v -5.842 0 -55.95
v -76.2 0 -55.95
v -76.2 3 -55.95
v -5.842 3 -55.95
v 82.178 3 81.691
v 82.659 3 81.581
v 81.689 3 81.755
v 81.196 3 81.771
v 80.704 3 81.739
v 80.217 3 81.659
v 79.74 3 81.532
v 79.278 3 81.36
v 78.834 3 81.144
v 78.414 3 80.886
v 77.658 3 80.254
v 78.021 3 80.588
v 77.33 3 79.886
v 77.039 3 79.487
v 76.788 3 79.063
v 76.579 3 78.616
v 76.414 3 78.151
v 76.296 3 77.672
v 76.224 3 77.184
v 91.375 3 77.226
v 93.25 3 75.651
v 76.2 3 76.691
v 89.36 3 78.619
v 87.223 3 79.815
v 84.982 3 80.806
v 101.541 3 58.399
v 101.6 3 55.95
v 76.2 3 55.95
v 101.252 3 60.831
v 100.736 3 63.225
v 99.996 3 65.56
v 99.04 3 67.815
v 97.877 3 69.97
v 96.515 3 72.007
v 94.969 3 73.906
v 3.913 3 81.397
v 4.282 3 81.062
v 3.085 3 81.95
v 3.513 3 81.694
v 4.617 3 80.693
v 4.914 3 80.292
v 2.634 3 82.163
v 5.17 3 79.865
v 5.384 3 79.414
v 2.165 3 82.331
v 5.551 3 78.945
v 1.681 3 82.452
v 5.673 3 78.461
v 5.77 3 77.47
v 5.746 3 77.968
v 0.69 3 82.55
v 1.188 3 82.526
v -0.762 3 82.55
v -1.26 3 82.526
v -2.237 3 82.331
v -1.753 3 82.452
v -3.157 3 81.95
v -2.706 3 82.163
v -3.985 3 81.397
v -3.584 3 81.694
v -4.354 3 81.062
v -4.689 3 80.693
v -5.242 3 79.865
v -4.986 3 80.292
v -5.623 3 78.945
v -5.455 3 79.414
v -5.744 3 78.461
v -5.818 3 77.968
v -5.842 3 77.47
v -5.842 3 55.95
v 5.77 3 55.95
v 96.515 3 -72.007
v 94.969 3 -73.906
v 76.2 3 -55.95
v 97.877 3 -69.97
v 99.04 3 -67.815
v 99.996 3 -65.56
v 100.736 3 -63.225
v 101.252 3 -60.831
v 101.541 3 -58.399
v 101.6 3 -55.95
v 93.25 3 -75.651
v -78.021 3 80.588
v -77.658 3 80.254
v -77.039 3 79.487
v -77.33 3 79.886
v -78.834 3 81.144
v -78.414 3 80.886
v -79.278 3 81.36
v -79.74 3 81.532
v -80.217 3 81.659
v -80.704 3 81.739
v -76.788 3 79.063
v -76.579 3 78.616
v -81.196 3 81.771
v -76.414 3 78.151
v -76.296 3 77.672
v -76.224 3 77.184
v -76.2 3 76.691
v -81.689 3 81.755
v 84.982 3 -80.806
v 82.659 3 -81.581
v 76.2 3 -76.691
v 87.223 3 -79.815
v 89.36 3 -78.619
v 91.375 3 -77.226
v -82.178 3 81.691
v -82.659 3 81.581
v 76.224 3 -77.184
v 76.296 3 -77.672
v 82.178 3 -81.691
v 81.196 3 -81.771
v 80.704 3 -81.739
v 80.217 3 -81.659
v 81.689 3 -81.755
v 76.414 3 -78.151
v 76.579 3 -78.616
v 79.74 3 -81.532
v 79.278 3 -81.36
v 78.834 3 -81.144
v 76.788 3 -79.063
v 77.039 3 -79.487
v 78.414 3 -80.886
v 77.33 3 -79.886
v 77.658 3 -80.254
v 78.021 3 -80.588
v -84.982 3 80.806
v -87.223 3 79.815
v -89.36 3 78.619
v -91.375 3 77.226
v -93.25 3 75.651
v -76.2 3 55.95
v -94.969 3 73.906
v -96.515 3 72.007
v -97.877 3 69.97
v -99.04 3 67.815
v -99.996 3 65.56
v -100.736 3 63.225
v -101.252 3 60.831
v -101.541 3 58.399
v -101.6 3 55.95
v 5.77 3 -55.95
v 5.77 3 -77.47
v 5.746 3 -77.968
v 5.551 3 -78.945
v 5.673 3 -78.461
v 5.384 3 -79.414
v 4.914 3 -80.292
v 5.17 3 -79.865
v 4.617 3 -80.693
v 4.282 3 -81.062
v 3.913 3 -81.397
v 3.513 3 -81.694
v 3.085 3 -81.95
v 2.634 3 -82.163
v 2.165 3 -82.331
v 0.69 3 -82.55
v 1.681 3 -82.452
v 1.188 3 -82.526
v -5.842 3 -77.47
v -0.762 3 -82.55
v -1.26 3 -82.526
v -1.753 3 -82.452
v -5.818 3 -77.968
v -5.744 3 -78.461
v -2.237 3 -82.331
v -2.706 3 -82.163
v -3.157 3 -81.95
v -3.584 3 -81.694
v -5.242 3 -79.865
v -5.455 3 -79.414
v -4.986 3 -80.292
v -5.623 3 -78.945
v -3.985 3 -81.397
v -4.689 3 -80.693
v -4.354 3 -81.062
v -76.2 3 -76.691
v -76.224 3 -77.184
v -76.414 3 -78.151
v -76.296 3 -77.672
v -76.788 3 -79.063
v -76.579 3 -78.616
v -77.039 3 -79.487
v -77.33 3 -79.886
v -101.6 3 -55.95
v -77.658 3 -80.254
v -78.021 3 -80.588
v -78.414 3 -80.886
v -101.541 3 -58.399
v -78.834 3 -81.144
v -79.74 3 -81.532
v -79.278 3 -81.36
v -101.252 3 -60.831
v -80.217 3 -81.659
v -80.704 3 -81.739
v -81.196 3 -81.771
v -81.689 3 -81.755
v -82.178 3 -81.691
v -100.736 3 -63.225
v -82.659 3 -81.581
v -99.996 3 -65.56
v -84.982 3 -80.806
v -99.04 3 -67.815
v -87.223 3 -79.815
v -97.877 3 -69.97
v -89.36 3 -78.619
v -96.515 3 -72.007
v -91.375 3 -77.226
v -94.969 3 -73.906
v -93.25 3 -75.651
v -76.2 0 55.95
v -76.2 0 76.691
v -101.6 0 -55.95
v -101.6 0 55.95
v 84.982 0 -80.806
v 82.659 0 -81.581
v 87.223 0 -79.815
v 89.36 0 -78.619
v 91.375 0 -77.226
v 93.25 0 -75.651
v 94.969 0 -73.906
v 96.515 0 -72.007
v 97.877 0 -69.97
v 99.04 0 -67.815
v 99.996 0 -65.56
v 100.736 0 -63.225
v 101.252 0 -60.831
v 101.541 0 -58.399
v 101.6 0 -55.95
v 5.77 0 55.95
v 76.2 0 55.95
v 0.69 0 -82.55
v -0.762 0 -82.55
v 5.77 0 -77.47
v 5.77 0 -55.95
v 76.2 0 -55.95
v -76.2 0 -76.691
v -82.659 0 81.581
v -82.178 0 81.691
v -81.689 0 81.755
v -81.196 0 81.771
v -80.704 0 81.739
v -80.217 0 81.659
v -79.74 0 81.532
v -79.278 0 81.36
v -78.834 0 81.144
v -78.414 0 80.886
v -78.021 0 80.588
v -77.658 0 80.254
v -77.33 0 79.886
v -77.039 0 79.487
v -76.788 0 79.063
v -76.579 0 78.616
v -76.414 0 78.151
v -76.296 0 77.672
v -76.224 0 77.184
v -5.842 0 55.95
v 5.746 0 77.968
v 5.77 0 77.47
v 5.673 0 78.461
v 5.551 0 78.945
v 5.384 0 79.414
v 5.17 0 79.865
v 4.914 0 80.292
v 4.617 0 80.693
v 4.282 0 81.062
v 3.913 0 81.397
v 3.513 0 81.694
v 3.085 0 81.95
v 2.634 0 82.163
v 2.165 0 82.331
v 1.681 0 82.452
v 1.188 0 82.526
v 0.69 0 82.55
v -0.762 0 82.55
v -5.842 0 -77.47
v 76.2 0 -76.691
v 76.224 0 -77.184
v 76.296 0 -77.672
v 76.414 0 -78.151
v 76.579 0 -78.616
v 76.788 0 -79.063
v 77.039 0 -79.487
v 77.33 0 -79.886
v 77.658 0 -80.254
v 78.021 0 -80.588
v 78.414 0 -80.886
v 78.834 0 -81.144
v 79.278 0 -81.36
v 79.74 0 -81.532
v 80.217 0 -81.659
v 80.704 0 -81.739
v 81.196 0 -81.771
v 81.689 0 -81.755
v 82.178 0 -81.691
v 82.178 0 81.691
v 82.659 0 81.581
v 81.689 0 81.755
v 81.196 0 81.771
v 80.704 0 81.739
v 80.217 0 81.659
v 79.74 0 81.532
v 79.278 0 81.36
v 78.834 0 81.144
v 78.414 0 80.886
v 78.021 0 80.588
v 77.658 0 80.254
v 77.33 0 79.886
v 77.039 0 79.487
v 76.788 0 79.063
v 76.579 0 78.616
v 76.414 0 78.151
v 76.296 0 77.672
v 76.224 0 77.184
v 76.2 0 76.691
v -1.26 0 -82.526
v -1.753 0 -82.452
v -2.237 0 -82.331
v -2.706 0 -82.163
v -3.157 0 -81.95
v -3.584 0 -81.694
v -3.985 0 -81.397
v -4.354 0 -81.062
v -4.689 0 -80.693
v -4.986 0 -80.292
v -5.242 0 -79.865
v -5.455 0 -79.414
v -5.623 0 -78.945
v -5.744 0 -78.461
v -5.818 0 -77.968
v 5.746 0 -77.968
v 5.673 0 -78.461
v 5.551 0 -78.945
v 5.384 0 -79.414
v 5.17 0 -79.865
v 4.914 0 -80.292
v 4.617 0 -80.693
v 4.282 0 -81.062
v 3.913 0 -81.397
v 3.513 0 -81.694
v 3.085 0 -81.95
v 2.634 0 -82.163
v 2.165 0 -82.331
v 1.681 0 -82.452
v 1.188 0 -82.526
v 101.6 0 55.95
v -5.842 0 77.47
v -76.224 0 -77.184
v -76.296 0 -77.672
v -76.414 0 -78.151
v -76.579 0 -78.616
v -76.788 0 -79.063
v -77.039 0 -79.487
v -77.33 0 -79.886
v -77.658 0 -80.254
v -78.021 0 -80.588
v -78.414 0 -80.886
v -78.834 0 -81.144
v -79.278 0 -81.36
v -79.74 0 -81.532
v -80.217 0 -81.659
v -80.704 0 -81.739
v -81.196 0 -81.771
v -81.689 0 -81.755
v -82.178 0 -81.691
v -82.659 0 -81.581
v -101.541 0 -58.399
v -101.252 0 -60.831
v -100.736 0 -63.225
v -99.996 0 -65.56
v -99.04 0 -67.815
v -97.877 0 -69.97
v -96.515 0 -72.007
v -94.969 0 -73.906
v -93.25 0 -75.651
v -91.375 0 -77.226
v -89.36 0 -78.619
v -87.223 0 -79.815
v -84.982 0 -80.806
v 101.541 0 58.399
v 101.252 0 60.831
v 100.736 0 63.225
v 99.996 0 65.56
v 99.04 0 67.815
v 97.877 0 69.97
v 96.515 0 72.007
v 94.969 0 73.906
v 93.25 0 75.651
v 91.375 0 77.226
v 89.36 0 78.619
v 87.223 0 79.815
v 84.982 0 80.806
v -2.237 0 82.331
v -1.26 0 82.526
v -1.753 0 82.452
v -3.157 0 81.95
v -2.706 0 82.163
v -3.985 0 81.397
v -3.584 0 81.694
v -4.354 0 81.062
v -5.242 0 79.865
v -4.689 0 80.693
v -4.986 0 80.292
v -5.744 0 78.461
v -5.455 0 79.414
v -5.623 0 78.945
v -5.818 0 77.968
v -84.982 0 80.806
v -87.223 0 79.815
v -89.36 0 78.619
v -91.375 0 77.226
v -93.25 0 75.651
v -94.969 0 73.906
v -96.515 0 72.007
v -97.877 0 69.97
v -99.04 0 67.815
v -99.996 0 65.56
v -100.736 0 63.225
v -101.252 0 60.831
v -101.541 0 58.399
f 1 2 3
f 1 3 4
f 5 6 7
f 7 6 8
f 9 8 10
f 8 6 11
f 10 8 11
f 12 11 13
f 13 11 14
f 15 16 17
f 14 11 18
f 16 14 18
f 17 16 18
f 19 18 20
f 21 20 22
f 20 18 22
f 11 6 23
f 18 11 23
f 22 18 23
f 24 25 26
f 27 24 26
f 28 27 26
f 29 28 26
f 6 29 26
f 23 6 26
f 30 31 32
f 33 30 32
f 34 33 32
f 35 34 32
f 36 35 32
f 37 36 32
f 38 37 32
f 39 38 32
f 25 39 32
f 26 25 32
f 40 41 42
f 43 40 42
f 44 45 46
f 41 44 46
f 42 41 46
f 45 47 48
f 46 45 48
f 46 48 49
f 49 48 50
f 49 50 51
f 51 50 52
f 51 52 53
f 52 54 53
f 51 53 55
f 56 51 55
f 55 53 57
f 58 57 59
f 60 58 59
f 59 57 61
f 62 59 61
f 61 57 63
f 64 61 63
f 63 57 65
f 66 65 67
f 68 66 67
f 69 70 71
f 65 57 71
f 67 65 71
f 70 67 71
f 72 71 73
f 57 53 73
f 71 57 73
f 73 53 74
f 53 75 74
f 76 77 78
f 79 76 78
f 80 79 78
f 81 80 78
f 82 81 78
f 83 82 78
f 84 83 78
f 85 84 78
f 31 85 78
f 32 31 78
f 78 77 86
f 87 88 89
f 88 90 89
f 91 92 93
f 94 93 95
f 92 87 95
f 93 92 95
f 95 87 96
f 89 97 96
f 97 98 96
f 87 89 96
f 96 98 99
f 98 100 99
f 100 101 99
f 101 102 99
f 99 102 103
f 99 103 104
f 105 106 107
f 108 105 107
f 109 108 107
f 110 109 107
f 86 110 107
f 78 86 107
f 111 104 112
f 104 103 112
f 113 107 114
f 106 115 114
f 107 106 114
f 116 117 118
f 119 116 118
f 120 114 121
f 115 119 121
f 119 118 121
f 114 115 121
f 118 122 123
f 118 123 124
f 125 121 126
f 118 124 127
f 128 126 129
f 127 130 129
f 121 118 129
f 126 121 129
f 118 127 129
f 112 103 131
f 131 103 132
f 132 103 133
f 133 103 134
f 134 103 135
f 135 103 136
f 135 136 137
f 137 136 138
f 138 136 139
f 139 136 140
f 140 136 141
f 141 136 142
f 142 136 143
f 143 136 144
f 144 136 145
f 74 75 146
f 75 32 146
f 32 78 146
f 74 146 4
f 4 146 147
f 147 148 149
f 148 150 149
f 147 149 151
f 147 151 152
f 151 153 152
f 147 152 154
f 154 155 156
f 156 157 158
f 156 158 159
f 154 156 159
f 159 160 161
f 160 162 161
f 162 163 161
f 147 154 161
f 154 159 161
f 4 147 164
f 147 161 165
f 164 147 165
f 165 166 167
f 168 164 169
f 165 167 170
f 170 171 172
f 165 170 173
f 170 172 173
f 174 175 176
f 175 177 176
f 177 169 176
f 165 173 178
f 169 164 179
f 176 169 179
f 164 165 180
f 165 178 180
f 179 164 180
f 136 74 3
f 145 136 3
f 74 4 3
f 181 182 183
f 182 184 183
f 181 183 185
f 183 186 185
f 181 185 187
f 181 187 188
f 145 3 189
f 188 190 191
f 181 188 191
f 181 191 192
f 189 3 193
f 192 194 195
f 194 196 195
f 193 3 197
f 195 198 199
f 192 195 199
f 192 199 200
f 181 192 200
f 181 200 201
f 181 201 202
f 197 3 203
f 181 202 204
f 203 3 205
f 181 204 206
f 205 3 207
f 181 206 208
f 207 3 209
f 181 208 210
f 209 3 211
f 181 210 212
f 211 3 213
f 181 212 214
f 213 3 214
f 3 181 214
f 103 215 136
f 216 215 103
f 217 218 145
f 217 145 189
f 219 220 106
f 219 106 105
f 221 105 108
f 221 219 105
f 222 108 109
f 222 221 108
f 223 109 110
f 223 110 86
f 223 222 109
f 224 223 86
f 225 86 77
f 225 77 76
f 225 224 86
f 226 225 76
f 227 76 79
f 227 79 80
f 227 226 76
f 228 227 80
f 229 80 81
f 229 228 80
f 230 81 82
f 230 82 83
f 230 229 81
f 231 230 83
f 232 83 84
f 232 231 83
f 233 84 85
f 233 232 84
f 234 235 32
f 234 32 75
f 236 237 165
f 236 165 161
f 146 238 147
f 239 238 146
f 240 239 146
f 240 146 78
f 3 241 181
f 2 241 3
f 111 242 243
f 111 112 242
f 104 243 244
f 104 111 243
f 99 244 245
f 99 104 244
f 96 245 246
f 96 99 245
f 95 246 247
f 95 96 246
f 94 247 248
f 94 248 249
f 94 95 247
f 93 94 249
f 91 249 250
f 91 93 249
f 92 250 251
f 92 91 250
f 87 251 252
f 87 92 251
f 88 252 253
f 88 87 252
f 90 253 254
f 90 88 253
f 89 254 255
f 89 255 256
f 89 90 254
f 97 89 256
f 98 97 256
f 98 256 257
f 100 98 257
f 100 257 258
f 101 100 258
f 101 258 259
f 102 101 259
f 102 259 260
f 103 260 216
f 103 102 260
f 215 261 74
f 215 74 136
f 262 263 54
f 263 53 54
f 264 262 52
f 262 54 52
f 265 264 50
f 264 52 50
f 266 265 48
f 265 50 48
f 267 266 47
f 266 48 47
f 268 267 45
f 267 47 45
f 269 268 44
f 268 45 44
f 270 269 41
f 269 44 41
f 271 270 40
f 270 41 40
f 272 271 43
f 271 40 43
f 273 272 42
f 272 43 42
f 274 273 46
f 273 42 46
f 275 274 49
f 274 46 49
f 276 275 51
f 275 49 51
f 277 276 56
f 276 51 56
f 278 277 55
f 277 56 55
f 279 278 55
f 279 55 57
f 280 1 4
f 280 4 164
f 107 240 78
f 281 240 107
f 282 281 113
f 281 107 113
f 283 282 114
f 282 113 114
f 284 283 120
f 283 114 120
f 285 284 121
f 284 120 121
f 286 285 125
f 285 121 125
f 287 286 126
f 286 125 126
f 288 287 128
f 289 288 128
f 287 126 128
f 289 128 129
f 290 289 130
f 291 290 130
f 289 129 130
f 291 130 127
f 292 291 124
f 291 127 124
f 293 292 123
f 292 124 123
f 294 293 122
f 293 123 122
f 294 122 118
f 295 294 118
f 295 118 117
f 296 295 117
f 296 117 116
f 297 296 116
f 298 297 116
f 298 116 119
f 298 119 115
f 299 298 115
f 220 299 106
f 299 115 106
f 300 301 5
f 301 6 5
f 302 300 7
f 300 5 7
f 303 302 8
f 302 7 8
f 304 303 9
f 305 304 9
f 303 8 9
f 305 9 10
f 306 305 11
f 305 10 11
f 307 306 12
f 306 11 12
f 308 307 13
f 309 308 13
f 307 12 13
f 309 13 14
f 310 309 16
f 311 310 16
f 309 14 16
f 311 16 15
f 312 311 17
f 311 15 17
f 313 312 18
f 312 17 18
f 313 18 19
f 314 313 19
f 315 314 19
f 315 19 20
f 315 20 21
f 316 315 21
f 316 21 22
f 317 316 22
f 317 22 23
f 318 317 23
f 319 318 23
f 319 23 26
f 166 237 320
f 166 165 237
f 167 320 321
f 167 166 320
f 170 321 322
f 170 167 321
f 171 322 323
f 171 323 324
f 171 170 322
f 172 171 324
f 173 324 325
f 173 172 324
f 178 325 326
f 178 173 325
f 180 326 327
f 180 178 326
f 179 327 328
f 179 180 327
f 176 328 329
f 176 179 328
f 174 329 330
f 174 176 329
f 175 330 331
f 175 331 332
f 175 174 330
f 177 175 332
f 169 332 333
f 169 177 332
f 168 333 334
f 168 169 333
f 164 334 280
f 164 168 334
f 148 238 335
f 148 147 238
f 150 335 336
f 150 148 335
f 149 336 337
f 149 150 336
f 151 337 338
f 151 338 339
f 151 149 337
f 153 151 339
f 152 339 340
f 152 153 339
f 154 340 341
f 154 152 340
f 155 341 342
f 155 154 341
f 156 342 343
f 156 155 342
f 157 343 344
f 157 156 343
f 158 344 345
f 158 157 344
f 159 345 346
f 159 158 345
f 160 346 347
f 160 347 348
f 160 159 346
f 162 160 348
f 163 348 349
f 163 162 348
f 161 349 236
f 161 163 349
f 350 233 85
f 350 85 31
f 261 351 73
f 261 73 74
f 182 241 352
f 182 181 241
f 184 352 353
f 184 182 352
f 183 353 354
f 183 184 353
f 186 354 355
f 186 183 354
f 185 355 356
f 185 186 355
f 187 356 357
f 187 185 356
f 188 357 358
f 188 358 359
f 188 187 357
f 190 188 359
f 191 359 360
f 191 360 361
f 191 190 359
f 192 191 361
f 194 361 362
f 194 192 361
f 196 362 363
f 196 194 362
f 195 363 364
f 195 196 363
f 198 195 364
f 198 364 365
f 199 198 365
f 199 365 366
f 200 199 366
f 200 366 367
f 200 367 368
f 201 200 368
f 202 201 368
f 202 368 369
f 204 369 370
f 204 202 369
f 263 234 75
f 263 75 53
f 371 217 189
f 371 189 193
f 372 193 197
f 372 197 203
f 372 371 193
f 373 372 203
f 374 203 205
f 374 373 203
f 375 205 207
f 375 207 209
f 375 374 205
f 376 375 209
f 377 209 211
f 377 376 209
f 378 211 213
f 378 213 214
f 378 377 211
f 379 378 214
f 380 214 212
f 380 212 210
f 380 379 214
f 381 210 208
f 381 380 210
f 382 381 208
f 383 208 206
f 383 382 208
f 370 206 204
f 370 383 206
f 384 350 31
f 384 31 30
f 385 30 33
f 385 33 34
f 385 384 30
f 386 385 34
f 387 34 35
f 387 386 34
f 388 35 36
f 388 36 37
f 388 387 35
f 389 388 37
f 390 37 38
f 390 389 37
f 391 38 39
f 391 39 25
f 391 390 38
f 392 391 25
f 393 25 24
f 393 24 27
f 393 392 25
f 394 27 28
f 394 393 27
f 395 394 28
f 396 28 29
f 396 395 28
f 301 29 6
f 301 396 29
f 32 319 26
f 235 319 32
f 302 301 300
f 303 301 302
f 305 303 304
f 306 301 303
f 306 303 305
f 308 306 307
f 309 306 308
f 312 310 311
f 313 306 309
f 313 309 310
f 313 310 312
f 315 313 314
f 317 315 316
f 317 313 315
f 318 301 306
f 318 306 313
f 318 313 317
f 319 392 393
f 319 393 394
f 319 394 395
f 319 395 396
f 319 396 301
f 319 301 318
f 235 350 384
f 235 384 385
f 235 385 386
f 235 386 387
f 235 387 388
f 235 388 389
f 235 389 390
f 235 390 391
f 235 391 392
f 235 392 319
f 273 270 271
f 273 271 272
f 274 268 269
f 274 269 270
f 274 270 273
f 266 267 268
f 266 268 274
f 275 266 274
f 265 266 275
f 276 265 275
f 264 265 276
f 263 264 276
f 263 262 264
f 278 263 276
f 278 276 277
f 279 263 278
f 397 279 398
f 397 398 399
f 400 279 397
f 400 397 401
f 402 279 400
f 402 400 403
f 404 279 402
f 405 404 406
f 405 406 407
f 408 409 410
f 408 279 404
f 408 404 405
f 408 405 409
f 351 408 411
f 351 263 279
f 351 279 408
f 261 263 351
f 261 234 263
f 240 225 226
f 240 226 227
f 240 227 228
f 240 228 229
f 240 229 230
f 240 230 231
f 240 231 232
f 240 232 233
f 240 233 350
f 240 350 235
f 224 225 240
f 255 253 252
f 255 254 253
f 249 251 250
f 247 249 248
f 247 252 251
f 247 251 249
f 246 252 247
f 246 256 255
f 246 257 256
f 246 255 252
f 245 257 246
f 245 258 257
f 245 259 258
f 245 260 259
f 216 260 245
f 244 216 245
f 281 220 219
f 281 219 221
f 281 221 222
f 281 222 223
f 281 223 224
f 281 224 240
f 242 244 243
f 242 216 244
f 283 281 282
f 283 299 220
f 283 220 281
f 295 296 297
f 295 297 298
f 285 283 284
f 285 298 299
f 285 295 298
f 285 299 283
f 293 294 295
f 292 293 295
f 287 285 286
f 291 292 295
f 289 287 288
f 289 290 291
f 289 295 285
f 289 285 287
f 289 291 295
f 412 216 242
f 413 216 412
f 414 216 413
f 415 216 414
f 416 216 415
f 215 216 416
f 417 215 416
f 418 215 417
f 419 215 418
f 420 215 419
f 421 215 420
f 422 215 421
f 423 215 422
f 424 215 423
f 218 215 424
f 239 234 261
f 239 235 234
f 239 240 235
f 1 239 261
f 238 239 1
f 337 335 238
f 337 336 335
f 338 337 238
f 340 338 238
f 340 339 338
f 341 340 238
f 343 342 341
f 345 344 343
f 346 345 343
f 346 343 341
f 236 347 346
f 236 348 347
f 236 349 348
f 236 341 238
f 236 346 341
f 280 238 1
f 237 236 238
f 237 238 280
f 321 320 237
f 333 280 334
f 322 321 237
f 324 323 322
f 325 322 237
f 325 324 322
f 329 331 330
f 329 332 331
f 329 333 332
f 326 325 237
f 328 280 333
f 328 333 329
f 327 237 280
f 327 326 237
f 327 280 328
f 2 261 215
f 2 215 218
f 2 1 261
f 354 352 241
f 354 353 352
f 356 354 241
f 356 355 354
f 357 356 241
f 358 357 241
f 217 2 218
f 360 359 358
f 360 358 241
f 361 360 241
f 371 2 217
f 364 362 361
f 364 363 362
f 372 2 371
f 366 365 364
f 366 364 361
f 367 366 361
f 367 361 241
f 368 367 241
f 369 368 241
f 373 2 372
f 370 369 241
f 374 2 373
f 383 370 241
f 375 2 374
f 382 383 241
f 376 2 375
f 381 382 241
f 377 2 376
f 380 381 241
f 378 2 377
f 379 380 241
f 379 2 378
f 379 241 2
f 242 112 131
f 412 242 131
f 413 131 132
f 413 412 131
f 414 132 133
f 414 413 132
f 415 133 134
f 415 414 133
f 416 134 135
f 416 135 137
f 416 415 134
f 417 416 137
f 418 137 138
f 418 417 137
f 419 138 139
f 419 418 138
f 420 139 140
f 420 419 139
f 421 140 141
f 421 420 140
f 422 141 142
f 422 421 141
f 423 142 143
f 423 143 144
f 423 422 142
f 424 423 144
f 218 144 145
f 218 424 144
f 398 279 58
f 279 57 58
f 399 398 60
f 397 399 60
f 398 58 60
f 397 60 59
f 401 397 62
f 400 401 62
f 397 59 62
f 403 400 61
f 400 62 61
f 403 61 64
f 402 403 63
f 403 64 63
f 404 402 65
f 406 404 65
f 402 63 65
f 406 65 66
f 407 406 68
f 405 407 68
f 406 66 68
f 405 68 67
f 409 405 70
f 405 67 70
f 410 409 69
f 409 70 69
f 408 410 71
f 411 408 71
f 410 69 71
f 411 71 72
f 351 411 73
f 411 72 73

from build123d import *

# Parameters (mm, degrees)
BOSS_EXTRUDE1_DEPTH = 3
FILLET1_R           = 5.08
FILLET2_R           = 5.08
FILLET3_R           = 5.08


with BuildPart() as part:
    # Sketch1 → Boss-Extrude1 (new body)
    with BuildSketch(Plane(origin=(0, 0, 0), x_dir=(1, 0, 0), z_dir=(0, 1, 0))):
        with BuildLine():
            Line((-76.2, 82.55), (-76.2, 55.95))
            Line((-76.2, 55.95), (-5.842, 55.95))
            Line((-5.842, 55.95), (-5.842, 82.55))
            Line((-5.842, 82.55), (5.770221656, 82.55))
            Line((5.770221656, 82.55), (5.770221656, 55.949868395))
            Line((5.770221656, 55.949868395), (76.2, 55.95))
            Line((76.2, 55.95), (76.2, 82.55))
            ThreePointArc((76.2, 82.55), (94.40904038, 74.510512242), (101.6, 55.95))
            Line((101.6, 55.95), (101.6, -55.95))
            ThreePointArc((101.6, -55.95), (94.40904038, -74.510512242), (76.2, -82.55))
            Line((76.2, -82.55), (76.2, -55.95))
            Line((76.2, -55.95), (5.770221656, -55.95))
            Line((5.770221656, -55.95), (5.770221656, -82.55))
            Line((5.770221656, -82.55), (-5.842, -82.55))
            Line((-5.842, -82.55), (-5.842, -55.95))
            Line((-5.842, -55.95), (-76.2, -55.95))
            Line((-76.2, -55.95), (-76.2, -82.55))
            ThreePointArc((-76.2, -82.55), (-94.40904038, -74.510512242), (-101.6, -55.95))
            Line((-101.6, -55.95), (-101.6, 55.95))
            ThreePointArc((-101.6, 55.95), (-94.40904038, 74.510512242), (-76.2, 82.55))
        make_face()
    extrude(amount=BOSS_EXTRUDE1_DEPTH)

    # Fillet1
    fillet1_edges = [part.edges().sort_by_distance(p)[0] for p in [
        (5.770221656, 1.5, 82.55),
        (-5.842, 1.5, 82.55),
    ]]
    fillet(fillet1_edges, radius=FILLET1_R)

    # Fillet2
    fillet2_edges = [part.edges().sort_by_distance(p)[0] for p in [
        (-5.842, 1.5, -82.55),
        (5.770221656, 1.5, -82.55),
    ]]
    fillet(fillet2_edges, radius=FILLET2_R)

    # Fillet3
    fillet3_edges = [part.edges().sort_by_distance(p)[0] for p in [
        (-76.2, 1.5, -82.55),
        (76.2, 1.5, -82.55),
        (76.2, 1.5, 82.55),
        (-76.2, 1.5, 82.55),
    ]]
    fillet(fillet3_edges, radius=FILLET3_R)


solid = part.part
